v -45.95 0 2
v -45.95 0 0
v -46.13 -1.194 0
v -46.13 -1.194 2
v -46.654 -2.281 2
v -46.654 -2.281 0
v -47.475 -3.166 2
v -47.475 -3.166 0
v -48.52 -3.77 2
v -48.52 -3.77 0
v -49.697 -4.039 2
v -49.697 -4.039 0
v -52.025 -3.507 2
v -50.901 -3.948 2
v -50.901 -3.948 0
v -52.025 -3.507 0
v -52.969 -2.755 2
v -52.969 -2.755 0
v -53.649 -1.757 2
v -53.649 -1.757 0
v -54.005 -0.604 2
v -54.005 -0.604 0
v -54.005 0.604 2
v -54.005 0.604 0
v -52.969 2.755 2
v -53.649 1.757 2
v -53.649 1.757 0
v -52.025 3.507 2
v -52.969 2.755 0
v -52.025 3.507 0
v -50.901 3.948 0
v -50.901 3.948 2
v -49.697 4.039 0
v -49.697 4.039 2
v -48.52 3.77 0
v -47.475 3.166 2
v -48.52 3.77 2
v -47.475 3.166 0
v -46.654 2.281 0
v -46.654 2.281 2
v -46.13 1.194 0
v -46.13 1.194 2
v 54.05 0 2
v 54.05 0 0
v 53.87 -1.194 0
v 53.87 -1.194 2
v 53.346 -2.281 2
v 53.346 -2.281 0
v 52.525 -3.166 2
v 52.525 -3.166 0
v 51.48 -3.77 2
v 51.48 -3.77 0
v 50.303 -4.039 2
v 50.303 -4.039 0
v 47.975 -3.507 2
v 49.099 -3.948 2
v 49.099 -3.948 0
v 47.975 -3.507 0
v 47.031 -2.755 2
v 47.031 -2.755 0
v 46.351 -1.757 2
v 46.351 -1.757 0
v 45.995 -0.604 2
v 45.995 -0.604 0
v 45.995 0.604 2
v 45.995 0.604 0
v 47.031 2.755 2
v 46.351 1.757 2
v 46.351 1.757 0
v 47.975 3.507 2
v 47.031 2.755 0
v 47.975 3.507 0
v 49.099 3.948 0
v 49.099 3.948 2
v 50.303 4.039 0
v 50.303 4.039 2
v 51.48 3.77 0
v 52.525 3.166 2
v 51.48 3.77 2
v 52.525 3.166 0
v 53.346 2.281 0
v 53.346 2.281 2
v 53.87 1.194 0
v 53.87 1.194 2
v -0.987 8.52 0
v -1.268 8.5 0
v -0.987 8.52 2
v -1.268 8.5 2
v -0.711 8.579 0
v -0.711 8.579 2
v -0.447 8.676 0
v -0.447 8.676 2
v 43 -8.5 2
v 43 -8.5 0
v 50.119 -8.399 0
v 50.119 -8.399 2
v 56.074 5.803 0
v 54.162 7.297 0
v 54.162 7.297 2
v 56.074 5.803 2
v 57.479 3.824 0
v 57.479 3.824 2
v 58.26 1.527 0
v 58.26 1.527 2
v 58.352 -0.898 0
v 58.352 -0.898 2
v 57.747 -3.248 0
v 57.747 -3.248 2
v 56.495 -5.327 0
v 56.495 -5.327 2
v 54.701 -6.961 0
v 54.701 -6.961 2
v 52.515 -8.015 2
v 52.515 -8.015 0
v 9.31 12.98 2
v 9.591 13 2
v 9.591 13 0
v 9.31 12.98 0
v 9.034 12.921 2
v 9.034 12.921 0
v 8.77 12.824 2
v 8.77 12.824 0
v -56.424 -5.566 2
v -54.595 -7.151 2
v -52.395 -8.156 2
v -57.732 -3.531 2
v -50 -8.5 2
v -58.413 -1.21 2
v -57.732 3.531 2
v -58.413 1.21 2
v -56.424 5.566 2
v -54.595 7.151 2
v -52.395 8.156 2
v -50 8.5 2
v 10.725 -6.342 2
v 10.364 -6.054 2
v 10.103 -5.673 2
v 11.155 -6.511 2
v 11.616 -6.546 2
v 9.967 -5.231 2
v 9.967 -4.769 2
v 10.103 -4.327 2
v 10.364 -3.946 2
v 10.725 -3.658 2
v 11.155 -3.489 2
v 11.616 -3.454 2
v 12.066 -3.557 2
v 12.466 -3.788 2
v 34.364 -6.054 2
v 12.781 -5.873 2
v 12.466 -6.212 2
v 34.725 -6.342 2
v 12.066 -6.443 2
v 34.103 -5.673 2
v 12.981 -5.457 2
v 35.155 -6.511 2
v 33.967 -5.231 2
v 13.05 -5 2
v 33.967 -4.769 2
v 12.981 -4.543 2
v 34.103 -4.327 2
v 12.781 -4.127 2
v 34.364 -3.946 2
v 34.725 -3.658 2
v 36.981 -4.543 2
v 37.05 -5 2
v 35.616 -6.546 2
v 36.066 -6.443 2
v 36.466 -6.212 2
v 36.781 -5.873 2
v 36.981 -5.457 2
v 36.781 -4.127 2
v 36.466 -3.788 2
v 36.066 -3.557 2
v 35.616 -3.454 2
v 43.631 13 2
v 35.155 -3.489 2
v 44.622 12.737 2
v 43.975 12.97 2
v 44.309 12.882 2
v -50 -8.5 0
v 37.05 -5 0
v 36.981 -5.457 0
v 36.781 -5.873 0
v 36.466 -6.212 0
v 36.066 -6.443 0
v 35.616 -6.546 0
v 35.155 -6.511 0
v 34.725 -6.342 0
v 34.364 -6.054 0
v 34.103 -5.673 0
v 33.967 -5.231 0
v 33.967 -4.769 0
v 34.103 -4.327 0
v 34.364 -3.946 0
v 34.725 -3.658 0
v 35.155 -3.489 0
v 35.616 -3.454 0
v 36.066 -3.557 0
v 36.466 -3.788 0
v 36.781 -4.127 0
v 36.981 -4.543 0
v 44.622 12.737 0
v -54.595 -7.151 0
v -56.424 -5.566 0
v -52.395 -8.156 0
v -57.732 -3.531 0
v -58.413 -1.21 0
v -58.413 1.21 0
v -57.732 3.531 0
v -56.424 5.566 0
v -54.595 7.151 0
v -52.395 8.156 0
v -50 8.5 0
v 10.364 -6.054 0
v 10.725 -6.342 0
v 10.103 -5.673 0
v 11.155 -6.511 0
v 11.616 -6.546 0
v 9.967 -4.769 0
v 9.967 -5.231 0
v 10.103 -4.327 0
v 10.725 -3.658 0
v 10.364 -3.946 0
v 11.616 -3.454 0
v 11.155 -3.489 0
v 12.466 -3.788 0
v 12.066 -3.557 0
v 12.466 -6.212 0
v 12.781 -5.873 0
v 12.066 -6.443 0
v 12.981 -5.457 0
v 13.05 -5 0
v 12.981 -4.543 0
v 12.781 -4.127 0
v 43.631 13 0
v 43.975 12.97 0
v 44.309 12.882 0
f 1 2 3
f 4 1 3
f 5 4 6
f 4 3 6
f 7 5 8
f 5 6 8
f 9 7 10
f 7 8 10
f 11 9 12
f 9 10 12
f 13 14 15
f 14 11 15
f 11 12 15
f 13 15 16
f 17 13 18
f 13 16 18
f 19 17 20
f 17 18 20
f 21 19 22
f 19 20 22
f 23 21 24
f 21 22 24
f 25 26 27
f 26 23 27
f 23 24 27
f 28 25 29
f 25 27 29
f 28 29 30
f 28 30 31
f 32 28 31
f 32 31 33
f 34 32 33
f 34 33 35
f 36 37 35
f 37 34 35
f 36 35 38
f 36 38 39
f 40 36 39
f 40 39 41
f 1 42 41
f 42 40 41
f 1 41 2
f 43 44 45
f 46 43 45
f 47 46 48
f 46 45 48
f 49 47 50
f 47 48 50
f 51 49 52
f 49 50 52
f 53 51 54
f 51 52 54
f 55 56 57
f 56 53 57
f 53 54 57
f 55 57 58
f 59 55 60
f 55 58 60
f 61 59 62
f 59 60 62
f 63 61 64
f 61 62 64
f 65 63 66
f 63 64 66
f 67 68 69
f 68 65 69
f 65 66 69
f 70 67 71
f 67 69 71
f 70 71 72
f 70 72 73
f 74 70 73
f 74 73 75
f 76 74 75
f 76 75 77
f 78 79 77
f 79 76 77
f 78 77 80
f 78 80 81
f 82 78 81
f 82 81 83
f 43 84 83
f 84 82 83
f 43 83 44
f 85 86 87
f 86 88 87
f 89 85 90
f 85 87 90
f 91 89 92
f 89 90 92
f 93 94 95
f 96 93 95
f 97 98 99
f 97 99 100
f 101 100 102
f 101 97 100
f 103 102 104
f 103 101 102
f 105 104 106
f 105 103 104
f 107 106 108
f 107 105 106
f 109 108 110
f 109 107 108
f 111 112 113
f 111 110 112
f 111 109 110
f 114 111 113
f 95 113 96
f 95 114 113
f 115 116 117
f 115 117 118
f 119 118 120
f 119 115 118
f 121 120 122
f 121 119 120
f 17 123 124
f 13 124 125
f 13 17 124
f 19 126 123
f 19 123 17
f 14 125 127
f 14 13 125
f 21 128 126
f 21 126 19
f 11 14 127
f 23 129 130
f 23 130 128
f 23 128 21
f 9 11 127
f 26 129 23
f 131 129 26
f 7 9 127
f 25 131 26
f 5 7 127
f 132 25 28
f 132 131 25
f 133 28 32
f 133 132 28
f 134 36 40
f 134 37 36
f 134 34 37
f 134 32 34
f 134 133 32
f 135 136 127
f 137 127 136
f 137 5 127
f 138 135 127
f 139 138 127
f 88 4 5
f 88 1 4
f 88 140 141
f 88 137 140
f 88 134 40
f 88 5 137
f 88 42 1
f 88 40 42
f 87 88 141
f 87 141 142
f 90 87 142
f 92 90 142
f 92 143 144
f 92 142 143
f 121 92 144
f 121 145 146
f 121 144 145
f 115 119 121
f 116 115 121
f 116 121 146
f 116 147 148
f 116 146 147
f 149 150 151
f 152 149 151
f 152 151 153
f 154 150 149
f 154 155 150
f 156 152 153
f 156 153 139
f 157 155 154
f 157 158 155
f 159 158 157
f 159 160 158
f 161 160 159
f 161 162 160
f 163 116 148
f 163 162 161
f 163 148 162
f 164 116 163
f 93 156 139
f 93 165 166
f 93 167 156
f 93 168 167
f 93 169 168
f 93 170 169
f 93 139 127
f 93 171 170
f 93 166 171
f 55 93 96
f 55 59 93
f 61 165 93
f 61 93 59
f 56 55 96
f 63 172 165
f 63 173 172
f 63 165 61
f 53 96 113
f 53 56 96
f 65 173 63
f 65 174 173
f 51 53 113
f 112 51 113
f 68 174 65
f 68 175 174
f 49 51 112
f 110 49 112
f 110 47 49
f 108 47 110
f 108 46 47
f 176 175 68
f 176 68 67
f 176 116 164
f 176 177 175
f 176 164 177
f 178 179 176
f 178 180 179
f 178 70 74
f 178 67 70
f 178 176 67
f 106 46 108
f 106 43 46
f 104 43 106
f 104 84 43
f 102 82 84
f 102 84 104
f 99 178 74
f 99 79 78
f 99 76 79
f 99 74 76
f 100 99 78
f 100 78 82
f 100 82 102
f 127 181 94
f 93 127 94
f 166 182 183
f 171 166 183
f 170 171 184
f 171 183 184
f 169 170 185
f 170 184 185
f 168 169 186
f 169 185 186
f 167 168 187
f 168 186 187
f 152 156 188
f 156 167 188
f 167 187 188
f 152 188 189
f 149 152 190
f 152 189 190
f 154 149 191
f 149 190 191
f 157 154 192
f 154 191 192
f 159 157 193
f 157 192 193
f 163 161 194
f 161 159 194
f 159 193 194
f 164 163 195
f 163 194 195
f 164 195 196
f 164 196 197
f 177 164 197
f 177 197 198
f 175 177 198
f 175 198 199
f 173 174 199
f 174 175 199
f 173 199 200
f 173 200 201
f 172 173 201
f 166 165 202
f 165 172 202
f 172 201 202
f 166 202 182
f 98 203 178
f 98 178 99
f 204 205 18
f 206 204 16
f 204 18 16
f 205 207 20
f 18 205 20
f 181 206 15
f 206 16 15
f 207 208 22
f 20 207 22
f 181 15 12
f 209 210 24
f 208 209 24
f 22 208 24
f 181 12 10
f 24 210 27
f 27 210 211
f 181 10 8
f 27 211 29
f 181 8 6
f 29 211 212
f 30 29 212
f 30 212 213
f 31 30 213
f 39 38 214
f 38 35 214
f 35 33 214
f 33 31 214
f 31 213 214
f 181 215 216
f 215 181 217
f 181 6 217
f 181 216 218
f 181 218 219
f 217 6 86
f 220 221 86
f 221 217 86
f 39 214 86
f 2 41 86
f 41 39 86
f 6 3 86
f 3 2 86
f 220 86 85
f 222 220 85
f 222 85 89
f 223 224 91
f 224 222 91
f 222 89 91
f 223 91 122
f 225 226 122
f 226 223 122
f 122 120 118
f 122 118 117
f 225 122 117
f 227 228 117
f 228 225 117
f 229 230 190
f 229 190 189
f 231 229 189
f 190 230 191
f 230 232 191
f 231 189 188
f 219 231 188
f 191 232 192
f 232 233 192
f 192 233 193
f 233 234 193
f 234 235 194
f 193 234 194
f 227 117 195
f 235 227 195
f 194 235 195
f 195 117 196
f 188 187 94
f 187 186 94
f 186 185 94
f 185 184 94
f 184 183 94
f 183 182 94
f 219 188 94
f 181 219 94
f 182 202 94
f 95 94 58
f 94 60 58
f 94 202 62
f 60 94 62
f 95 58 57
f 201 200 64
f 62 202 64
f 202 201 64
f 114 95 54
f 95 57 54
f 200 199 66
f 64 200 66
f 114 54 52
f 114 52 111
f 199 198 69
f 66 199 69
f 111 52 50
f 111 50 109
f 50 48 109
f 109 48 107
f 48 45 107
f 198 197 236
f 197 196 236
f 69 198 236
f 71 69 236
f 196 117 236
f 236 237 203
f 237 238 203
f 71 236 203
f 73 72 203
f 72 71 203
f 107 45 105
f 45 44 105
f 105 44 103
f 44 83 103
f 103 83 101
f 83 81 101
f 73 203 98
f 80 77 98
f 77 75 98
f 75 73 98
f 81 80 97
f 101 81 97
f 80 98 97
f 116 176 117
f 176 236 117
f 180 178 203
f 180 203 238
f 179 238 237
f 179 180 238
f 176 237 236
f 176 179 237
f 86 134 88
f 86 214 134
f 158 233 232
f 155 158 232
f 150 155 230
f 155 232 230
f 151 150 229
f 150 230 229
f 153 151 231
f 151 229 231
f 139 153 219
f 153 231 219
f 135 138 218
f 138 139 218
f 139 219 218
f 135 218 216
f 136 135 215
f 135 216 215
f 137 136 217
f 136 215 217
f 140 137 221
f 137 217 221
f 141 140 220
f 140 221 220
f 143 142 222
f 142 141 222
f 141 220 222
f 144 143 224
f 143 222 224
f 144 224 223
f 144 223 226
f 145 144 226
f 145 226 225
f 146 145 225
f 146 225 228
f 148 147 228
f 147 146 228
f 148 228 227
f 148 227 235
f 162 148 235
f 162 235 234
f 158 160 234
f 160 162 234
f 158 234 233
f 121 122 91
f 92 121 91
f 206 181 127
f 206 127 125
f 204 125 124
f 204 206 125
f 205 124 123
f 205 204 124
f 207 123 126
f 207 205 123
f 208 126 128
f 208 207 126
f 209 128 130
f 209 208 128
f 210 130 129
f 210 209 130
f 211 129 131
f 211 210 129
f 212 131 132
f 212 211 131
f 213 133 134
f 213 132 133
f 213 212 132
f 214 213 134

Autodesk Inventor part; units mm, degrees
ref_plane "YZ Plane" through (0, 0, 0) normal (1, 0, 0) x (0, 1, 0)
ref_plane "XZ Plane" through (0, 0, 0) normal (0, 1, 0) x (-1, 0, 0)
ref_plane "XY Plane" through (0, 0, 0) normal (0, 0, 1) x (1, 0, 0)
sketch "スケッチ1" plane through (0, 0, 0) normal (0, 0, 1) x (1, 0, 0)
  line L0 (-50, 0) -> (50, 0) construction
  circle A0 centre (-50, 0) radius 4.05
  circle A1 centre (50, 0) radius 4.05
  line L1 (-50, 8.5) -> (43, 8.5)
  line L2 (-50, -8.5) -> (43, -8.5)
  arc A2 (-50, 8.5) -> (-50, -8.5) centre (-50, 0) ccw
  line L3 (43, -8.5) -> (50.119, -8.3992)
  line L4 (43, 8.5) -> (50.119, 8.3992)
  arc A3 (50.119, -8.3992) -> (50.119, 8.3992) centre (50, 0) ccw
  line L5 (9, -7.5) -> (38, -7.5) construction
  line L6 (38, -7.5) -> (38, -2.5) construction
  line L7 (38, -2.5) -> (9, -2.5) construction
  line L8 (9, -2.5) -> (9, -7.5) construction
  line L9 (9, -5) -> (38, -5) construction
  circle A4 centre (11.5, -5) radius 1.55
  line L10 (23.5, -5) -> (23.5, -2.5) construction
  line L11 (44.1615, 13) -> (9.1615, 13)
  line L12 (9.1615, 13) -> (-0.8385, 8.5)
  line L13 (44.1615, 13) -> (54.1615, 7.2967)
  circle A5 centre (35.5, -5) radius 1.55
  point P0 (0, 0)
  point P1 (0, 0)
  point P2 (52.0517, 8.5)
  dimension "d0" = 100
  dimension "d1" = 8.1
  dimension "d2" = 8.5
  dimension "d8" = 8.1
  dimension "d9" = 7
  dimension "d10" = 8.4
  dimension "d12" = 5
  dimension "d13" = 29
  dimension "d15" = 2.5
  dimension "d17" = 13
  dimension "d19" = 10
  dimension "d20" = 35
  dimension "d25" = 12
  dimension "d26" = 10
  dimension "d34" = 1
  dimension "d35" = 3.1
extrude "押し出し1" add sketch "スケッチ1" along normal blind 2
fillet "フィレット1" radius 2 3 edges at (-0.8385, 8.5, 1) (9.1615, 13, 1) (44.1615, 13, 1)
equation "\"d8\" = d1"
equation "\"d19\" = d18"
equation "\"d26\" = d19"
equation "\"d18\" = 10"
properties part number "リンク_メインフレーム_6_3" material "GFRP"
